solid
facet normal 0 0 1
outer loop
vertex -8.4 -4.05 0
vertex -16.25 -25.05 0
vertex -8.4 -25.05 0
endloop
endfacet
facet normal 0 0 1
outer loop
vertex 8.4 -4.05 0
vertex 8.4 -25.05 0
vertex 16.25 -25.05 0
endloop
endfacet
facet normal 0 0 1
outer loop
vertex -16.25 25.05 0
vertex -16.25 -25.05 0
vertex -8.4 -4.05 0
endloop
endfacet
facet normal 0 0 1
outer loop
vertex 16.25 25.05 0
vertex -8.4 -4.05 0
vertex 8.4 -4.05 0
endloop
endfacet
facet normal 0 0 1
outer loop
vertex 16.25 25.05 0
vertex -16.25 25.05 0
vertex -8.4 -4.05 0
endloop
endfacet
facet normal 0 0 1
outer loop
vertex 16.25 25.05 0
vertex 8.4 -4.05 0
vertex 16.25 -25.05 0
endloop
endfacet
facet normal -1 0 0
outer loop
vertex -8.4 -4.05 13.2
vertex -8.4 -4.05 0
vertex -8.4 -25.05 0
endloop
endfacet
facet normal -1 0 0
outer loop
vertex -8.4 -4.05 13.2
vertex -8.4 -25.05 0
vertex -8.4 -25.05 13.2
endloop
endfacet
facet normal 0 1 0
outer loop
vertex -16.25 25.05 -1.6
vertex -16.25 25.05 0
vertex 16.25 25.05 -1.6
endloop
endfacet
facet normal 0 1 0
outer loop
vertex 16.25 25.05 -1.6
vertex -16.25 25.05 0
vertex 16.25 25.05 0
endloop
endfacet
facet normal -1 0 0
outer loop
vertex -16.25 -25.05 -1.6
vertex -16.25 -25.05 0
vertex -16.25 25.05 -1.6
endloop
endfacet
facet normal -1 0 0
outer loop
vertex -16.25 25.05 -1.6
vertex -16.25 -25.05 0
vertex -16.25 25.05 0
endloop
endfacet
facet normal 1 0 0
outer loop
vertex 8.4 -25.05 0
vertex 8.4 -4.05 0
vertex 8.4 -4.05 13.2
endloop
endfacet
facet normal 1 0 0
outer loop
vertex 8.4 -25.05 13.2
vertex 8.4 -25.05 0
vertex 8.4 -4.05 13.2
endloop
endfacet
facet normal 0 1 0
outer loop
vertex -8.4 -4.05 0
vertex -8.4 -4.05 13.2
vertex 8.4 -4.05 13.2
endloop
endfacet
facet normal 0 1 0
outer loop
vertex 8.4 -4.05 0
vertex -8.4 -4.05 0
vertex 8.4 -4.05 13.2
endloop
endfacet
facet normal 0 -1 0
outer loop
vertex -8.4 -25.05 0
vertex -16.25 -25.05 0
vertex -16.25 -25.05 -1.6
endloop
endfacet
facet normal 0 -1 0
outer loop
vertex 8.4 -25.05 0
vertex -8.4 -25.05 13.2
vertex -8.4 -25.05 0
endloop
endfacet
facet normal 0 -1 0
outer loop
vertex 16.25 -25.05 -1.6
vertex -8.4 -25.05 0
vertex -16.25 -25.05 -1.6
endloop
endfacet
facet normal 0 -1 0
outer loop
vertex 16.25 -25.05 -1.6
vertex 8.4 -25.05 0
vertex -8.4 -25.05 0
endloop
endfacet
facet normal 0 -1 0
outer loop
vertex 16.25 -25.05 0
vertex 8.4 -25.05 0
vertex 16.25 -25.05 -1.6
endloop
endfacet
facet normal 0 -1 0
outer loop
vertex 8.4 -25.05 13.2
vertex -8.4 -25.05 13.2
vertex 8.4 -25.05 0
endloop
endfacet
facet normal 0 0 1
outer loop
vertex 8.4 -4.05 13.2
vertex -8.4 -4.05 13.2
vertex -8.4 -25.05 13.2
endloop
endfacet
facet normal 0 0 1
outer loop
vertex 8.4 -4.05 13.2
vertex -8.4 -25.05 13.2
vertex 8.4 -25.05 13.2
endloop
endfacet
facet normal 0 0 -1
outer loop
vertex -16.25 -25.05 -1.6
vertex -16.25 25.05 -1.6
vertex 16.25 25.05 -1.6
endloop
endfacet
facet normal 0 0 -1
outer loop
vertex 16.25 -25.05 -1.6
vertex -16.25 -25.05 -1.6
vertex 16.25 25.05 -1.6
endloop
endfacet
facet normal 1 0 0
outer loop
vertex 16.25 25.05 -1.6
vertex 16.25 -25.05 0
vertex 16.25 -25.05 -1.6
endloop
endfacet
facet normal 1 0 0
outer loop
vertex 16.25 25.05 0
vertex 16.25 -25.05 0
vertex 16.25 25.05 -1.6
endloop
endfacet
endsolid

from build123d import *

# Parameters (mm, degrees)
F0_W     = 32.5
F0_H     = 50.1
F2_DEPTH = 1.6
F3_START = 4.05
F1_W     = 16.8
F1_H     = 13.2
F3_DEPTH = 21


with BuildPart() as f2:
    # F0 (on Top) → F2 (new body)
    with BuildSketch(Plane.XY):
        Rectangle(F0_W, F0_H)
    extrude(amount=-F2_DEPTH)

    # F1 (on Front) → F3 (join)
    with BuildSketch(Plane.XZ.offset(F3_START)):
        with Locations((0, 6.6)):
            Rectangle(F1_W, F1_H)
    extrude(amount=F3_DEPTH)


solid = f2.part
